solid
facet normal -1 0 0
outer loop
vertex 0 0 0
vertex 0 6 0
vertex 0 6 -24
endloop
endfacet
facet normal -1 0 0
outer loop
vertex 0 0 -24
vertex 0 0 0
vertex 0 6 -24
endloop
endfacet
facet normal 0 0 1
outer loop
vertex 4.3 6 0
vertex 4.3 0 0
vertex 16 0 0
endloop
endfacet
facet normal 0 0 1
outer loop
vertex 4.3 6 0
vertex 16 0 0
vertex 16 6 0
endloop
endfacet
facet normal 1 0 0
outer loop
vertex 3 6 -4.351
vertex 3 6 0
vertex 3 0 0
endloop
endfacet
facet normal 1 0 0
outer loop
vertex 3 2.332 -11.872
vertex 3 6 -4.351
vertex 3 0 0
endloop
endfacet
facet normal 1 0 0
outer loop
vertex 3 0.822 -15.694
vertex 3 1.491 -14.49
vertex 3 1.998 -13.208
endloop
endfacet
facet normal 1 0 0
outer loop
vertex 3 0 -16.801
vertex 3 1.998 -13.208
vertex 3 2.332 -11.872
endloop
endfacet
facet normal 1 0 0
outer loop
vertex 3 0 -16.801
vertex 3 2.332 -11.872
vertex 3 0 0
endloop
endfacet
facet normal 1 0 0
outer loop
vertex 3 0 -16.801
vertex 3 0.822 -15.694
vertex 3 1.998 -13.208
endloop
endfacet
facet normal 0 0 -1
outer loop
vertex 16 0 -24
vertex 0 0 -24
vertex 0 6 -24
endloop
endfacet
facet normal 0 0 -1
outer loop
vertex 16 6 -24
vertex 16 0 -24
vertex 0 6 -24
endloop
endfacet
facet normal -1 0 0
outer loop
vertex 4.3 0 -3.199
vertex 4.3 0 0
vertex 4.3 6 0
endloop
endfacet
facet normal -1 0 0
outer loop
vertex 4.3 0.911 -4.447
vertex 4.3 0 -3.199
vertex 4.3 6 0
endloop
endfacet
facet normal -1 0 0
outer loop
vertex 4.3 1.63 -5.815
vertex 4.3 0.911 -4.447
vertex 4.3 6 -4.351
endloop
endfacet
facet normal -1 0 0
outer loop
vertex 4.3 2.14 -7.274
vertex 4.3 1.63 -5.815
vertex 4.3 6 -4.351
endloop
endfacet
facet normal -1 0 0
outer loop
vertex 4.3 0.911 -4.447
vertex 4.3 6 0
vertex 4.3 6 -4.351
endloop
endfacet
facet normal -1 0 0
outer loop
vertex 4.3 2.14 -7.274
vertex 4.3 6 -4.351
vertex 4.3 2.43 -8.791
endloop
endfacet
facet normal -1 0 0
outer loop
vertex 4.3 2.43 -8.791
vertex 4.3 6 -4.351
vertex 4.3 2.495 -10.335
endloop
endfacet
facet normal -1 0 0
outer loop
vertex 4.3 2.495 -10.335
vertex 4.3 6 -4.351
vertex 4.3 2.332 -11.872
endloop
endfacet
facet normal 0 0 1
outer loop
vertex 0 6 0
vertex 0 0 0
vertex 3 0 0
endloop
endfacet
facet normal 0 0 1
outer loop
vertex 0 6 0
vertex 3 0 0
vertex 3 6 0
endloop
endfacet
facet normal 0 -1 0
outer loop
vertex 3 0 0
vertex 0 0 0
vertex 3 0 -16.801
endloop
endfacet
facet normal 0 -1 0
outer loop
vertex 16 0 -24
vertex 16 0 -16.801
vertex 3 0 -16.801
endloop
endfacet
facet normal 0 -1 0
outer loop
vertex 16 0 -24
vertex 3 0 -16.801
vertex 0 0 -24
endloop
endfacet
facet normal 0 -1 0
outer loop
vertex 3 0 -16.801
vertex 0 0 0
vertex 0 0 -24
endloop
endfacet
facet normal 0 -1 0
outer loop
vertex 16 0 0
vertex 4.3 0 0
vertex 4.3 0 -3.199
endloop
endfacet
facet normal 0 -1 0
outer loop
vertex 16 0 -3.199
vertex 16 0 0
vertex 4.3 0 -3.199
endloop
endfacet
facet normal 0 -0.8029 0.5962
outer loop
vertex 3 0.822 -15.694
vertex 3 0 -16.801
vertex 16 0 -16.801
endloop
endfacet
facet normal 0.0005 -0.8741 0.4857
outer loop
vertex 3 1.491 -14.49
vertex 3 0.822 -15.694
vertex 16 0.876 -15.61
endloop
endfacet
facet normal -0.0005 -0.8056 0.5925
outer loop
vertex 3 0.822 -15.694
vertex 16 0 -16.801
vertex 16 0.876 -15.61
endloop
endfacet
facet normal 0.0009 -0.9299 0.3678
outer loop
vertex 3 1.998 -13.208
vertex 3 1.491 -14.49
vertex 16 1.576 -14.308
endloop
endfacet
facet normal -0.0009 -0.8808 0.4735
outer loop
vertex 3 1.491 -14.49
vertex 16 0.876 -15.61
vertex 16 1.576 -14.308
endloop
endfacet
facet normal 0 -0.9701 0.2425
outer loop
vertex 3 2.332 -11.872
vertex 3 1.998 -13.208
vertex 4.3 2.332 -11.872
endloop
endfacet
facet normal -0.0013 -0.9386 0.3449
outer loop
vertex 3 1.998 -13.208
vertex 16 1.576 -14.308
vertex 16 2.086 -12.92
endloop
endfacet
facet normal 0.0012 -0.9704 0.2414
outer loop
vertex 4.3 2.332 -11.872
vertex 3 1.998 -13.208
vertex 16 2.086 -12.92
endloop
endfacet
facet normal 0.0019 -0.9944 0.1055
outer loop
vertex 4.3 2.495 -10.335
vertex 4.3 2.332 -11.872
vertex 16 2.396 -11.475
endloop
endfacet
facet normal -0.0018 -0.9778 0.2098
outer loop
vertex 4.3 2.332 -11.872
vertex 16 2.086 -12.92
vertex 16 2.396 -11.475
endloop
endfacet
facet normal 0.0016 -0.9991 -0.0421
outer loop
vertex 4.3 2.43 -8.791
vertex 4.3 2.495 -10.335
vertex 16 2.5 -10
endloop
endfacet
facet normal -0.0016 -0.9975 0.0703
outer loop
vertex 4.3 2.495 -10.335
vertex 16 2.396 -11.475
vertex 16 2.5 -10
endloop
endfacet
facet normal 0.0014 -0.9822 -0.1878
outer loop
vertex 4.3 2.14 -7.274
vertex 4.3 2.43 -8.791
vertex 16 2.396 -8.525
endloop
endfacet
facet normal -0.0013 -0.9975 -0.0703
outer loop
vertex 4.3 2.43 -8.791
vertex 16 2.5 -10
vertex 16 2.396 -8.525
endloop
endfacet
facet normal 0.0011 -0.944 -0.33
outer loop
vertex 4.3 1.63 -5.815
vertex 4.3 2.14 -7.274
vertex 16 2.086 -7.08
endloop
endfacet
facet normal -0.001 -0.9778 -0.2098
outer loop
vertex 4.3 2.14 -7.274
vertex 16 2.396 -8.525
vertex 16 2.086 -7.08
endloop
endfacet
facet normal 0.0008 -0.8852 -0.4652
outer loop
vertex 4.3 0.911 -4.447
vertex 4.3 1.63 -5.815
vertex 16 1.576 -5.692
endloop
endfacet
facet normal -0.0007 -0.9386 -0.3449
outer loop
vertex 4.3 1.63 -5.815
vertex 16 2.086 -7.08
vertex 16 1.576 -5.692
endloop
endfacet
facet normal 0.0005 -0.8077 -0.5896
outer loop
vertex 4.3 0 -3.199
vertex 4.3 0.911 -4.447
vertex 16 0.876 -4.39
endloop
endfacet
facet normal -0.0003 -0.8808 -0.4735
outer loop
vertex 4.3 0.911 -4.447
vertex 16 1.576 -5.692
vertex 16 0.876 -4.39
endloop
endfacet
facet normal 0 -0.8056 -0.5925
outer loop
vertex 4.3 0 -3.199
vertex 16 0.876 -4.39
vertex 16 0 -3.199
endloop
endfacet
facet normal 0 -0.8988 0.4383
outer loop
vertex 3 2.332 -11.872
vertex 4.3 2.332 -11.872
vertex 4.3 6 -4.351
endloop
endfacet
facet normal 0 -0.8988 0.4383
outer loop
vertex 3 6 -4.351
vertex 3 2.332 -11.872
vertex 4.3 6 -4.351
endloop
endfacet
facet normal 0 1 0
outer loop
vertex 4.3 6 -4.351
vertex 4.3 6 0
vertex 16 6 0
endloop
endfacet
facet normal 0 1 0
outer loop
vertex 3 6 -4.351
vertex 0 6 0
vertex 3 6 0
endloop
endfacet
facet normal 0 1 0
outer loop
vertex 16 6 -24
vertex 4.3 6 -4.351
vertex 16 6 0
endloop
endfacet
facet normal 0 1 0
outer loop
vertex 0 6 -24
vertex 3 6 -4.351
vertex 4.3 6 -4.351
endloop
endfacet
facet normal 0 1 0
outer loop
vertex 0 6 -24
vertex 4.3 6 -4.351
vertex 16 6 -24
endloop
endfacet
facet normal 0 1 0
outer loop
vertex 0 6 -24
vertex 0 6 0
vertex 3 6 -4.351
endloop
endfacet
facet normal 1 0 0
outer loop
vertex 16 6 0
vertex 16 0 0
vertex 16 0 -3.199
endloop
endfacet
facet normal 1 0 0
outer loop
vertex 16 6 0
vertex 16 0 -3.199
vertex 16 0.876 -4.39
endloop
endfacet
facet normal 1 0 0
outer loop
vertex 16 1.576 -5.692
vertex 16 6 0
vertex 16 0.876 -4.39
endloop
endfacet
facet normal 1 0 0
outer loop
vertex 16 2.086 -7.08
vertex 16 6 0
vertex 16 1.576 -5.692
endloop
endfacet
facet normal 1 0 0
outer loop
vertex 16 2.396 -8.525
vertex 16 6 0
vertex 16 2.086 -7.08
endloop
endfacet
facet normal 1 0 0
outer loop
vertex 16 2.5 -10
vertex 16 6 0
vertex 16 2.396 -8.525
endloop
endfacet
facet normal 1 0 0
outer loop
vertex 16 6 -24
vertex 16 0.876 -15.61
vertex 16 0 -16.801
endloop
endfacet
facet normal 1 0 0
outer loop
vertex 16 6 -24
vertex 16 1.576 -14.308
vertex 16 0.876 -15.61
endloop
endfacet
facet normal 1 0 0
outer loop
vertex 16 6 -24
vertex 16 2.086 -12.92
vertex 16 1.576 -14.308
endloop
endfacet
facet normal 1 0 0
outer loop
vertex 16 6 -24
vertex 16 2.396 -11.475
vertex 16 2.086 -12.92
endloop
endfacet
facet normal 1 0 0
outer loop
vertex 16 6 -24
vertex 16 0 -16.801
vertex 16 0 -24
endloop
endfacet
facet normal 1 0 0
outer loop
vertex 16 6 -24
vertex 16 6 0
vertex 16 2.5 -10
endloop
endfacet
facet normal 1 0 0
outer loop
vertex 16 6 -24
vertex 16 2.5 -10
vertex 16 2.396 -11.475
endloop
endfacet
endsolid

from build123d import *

# Parameters (mm, degrees)
SKETCH_1_W          = 24
SKETCH_1_H          = 6
EXTRUDE_1_DEPTH     = 16
CUT_EXTRUDE_1_DEPTH = 13
CUT_EXTRUDE_START   = -11.7
CUT_EXTRUDE_6_DEPTH = 1.3


with BuildPart() as part:
    # Эскиз1 → Бобышка-Вытянуть1 (new body)
    with BuildSketch(Plane(origin=(0, 0, 0), x_dir=(0, 0, -1), z_dir=(1, 0, 0))):
        with Locations((12, 3)):
            Rectangle(SKETCH_1_W, SKETCH_1_H)
    extrude(amount=EXTRUDE_1_DEPTH)

    # Эскиз2 → Вырез-Вытянуть1 (cut)
    with BuildSketch(Plane(origin=(16, 0, 0), x_dir=(0, 0, -1), z_dir=(1, 0, 0))):
        with BuildLine():
            ThreePointArc((16.800735254, 0), (10, 2.5), (3.199264746, 0))
            Line((3.199264746, 0), (16.800735254, 0))
        make_face()
    extrude(amount=-CUT_EXTRUDE_1_DEPTH, mode=Mode.SUBTRACT)

    # Эскиз3 → Вырез-Вытянуть6 (cut)
    with BuildSketch(Plane(origin=(16, 0, 0), x_dir=(0, 0, -1), z_dir=(1, 0, 0)).offset(CUT_EXTRUDE_START)):
        with BuildLine():
            Line((11.871529868, 2.331862173), (4.350732789, 6))
            Line((4.350732789, 6), (0, 6))
            Line((0, 6), (0, 0))
            Line((0, 0), (3.199264746, 0))
            ThreePointArc((3.199264746, 0), (7.273525769, 2.139839164), (11.871529868, 2.331862173))
        make_face()
    extrude(amount=-CUT_EXTRUDE_6_DEPTH, mode=Mode.SUBTRACT)


solid = part.part
